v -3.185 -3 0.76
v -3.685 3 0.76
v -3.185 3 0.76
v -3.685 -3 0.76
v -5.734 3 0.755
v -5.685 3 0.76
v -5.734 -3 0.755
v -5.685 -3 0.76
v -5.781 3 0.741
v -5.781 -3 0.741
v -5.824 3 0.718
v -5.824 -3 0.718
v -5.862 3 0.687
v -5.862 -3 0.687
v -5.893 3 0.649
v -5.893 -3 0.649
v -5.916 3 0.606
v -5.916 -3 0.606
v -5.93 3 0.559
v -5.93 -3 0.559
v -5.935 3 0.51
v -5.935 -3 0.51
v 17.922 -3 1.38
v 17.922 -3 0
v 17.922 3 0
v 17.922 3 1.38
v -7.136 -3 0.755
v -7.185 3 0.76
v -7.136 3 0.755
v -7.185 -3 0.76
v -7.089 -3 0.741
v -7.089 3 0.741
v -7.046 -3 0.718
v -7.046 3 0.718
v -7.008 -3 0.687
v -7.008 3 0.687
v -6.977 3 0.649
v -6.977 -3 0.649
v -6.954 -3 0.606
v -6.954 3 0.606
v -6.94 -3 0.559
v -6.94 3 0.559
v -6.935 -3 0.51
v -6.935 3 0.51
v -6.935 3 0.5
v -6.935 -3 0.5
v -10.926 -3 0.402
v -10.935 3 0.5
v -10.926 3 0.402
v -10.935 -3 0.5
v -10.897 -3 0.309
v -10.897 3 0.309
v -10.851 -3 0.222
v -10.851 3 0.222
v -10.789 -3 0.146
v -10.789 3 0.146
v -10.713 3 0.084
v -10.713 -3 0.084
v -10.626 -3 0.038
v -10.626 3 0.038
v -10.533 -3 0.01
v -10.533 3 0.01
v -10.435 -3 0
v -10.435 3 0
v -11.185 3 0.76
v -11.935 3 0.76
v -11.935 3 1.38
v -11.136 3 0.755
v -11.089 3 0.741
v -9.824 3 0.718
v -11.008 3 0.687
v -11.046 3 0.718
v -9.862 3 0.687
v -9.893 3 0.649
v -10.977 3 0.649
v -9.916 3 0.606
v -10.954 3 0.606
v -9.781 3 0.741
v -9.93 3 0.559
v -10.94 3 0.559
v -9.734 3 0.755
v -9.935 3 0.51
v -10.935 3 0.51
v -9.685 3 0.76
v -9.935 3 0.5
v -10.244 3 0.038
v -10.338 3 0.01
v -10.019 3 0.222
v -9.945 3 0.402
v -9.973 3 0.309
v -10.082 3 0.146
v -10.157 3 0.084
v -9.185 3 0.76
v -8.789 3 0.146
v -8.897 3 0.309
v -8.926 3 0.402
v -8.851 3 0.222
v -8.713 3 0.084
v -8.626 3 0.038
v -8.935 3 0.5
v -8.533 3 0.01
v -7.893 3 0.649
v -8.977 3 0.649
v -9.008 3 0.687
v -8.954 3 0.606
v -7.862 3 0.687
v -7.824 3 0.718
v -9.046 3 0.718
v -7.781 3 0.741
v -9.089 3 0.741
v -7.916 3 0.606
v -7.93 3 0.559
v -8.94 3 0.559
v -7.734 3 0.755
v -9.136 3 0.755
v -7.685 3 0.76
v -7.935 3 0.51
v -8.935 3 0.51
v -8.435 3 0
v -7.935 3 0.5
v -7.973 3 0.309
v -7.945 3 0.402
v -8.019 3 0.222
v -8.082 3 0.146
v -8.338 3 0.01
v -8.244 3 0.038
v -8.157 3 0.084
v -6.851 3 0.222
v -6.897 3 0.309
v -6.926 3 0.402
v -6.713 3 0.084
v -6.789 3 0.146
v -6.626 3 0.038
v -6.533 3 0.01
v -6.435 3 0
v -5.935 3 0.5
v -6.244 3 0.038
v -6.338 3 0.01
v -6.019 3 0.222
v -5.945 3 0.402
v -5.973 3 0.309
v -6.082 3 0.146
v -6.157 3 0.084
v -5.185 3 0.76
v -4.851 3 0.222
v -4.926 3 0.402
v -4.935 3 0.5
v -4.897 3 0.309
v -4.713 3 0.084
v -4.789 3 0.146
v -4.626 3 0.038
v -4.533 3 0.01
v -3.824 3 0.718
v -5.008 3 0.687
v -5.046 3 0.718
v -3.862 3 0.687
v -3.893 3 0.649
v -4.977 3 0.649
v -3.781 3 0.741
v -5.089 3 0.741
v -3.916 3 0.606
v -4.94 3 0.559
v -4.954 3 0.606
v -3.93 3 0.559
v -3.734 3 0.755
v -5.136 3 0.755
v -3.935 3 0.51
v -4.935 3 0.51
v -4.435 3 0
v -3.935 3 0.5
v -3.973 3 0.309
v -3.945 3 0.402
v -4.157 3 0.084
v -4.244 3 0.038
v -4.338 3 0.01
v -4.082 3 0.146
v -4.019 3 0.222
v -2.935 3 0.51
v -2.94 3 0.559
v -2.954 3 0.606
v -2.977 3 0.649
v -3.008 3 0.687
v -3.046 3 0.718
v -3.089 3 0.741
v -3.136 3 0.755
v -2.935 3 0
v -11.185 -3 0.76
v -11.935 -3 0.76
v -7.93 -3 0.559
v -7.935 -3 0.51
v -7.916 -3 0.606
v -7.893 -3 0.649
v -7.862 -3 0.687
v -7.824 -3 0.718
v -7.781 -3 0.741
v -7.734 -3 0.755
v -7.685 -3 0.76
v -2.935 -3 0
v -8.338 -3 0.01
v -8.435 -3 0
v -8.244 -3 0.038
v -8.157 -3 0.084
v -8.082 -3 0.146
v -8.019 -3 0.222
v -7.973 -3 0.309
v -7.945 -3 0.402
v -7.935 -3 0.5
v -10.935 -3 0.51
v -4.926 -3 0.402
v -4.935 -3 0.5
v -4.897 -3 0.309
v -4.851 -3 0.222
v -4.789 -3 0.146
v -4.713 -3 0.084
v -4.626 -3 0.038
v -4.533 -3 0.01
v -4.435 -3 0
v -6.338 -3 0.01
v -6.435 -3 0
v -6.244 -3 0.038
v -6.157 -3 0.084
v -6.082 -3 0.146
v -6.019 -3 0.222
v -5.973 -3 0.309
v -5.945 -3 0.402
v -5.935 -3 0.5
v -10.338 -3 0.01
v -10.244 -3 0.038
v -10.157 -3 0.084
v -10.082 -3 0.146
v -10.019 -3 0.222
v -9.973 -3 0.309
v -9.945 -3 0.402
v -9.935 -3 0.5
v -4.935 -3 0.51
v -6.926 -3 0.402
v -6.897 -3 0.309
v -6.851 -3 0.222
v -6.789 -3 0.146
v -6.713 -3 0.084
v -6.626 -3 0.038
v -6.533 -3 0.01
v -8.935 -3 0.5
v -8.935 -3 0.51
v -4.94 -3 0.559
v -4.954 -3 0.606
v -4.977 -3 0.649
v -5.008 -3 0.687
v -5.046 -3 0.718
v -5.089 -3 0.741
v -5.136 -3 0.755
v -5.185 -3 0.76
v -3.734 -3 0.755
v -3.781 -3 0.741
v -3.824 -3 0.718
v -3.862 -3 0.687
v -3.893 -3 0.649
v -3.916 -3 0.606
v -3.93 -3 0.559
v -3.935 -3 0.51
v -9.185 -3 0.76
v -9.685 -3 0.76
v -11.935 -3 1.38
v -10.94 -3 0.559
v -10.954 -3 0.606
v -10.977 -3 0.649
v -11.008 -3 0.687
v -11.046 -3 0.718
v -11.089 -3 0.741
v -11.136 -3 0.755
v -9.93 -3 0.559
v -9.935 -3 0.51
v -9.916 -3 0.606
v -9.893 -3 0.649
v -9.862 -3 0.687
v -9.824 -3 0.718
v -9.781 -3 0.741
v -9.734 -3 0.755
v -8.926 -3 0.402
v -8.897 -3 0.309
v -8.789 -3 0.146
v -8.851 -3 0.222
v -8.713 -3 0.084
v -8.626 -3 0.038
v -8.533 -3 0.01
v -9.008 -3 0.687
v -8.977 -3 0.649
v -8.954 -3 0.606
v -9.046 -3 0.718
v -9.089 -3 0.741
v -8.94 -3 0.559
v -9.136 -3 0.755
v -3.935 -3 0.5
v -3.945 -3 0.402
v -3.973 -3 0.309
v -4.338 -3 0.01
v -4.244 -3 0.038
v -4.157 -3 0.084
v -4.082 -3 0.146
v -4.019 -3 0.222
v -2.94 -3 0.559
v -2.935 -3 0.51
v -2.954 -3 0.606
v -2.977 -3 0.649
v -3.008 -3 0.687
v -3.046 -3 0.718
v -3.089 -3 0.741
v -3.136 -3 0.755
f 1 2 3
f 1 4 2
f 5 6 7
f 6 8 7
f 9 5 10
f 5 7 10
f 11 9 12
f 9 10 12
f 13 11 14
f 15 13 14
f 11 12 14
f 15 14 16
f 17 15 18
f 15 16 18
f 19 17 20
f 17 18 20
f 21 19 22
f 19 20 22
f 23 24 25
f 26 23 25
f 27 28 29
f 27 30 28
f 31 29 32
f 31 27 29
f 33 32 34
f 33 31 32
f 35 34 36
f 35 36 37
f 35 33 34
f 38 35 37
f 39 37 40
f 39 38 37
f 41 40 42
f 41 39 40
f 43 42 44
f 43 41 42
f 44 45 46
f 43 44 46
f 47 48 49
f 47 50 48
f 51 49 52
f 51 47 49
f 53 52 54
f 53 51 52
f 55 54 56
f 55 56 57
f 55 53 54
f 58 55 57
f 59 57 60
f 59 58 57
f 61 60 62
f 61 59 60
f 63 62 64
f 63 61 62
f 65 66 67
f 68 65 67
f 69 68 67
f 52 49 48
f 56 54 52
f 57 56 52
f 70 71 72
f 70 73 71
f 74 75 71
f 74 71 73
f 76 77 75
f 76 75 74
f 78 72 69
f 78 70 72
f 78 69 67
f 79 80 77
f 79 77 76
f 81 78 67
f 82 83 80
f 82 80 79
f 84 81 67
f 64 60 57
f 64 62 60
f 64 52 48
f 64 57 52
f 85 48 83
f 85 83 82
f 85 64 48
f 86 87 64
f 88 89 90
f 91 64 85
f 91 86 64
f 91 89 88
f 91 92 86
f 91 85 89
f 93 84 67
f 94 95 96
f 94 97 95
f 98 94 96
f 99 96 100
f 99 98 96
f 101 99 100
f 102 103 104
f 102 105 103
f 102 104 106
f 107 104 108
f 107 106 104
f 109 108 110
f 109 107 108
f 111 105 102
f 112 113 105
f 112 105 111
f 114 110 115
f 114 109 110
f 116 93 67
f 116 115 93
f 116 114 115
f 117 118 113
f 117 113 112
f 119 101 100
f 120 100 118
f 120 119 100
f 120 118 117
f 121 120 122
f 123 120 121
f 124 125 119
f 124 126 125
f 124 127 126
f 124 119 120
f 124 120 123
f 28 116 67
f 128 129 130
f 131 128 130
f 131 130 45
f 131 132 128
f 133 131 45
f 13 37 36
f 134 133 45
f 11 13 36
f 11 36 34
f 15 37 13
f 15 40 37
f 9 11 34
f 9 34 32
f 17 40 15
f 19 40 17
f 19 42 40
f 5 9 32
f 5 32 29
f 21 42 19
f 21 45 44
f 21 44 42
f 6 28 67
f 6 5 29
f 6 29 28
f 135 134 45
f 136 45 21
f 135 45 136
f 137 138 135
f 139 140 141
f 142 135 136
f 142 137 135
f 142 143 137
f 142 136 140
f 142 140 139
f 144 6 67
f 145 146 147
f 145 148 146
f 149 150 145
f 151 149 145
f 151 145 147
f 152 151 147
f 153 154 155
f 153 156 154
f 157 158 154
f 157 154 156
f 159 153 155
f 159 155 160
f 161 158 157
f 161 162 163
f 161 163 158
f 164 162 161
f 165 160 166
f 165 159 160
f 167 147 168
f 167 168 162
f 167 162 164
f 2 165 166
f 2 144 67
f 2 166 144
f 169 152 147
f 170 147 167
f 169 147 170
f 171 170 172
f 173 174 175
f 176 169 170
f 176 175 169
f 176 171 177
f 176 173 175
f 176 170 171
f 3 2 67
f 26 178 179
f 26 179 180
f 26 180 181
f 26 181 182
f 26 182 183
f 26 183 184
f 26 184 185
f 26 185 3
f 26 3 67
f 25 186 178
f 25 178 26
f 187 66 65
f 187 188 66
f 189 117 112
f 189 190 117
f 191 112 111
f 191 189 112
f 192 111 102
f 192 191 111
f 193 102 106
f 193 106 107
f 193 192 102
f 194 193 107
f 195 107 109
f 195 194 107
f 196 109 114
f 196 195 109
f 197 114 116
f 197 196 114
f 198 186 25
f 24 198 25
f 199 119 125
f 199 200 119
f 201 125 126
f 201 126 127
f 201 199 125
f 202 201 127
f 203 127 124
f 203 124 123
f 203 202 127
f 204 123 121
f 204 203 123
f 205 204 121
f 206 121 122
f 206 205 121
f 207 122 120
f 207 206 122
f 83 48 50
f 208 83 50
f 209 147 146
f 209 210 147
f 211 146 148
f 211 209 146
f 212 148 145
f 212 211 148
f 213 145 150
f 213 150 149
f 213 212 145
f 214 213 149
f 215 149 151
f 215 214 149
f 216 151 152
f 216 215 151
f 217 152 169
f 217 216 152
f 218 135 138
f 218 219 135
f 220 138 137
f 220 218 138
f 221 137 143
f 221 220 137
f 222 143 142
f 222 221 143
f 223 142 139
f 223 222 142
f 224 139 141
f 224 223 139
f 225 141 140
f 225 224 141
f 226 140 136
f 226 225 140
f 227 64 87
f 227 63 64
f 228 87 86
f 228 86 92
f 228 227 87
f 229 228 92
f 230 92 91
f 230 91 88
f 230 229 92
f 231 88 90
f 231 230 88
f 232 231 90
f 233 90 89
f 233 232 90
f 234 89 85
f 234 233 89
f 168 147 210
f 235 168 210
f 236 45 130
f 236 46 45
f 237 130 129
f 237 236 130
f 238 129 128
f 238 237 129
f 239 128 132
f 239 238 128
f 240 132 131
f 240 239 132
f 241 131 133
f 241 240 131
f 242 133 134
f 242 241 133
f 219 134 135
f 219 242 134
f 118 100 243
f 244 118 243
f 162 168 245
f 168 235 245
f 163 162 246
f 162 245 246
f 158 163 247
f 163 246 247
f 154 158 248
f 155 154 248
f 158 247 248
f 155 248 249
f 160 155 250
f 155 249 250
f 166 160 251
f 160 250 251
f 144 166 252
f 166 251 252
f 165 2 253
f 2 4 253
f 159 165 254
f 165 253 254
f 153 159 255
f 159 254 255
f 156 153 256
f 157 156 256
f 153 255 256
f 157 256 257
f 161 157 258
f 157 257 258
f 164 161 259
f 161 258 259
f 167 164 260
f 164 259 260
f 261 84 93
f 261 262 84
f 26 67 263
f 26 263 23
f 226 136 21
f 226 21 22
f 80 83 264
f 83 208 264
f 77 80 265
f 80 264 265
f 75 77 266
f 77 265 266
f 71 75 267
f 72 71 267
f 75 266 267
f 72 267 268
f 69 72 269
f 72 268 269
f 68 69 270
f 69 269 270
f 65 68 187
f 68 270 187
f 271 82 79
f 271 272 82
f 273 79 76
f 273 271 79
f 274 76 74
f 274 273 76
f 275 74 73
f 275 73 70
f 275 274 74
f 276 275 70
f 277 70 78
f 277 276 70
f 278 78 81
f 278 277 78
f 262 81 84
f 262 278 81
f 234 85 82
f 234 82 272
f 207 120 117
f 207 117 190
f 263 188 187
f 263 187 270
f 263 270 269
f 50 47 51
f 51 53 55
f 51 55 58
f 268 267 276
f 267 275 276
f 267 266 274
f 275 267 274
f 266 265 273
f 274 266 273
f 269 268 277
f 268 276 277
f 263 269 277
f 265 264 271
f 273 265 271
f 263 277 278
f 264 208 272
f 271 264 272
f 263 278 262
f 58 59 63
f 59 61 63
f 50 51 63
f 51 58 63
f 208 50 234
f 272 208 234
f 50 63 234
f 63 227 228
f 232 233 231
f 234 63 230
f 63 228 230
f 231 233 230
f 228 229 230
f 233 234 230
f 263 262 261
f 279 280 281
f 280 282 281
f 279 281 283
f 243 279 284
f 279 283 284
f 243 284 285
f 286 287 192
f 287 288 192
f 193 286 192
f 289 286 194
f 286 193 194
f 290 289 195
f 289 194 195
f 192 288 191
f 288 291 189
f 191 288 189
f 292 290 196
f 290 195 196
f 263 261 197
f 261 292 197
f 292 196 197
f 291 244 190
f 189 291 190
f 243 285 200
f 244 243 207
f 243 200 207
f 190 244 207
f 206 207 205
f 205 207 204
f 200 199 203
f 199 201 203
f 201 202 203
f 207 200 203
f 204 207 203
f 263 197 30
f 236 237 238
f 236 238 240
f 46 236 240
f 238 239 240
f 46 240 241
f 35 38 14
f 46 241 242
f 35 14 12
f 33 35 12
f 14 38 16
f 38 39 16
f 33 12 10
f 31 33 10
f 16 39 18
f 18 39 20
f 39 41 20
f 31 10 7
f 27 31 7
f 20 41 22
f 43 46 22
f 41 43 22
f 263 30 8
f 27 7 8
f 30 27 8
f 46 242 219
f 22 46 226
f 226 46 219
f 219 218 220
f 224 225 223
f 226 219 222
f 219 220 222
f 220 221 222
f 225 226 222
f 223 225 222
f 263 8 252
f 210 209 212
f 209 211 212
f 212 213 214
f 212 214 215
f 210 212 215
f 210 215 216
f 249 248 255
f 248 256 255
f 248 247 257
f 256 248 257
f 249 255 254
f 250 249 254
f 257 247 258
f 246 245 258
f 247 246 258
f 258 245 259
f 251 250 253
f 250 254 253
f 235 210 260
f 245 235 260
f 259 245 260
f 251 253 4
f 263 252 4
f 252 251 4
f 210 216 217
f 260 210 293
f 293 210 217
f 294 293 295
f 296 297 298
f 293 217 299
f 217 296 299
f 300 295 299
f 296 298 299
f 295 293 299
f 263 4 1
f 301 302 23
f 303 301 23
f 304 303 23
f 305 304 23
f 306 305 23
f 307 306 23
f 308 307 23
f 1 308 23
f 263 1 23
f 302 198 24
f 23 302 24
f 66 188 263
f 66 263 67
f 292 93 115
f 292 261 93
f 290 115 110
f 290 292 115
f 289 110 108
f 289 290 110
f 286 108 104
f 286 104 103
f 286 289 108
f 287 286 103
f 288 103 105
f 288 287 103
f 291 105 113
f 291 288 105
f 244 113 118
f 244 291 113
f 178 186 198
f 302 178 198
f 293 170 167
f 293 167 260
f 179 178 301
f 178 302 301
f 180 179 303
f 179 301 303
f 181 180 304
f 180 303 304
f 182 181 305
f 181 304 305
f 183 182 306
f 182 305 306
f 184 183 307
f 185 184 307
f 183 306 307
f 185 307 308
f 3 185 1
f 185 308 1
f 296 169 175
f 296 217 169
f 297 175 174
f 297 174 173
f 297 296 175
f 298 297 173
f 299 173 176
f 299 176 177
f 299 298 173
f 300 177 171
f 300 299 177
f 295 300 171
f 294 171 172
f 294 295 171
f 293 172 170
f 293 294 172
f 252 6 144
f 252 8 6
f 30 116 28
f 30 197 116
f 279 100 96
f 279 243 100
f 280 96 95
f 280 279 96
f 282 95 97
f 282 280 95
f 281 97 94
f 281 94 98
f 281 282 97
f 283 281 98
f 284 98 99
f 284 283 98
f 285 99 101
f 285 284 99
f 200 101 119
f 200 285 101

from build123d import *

# Parameters (mm, degrees)
F0_W     = 29.8571444048
F0_H     = 6
F1_DEPTH = 1.38
F2_W     = 1
F2_H     = 6
F3_DEPTH = 0.76
F4_R     = 0.49999
F5_R     = 0.25


# Not quite as in the source:
# - a fillet or chamfer is up to 0.001 mm smaller than in the source, because OpenCascade refuses the exact size


with BuildPart() as f1:
    # F0 (on Top) → F1 (new body)
    with BuildSketch(Plane.XY):
        with Locations((2.9934216291, 0)):
            Rectangle(F0_W, F0_H)
    extrude(amount=F1_DEPTH)

    # F2 (on face) → F3 (cut)
    with BuildSketch(Plane(origin=(0, 0, 0), x_dir=(1, 0, 0), z_dir=(0, 0, -1))):
        with Locations((-11.4351505733, 0)):
            Rectangle(F2_W, F2_H)
        with Locations((-9.4351505733, 0)):
            Rectangle(F2_W, F2_H)
        with Locations((-7.4351505733, 0)):
            Rectangle(F2_W, F2_H)
        with Locations((-5.4351505733, 0)):
            Rectangle(F2_W, F2_H)
        with Locations((-3.4351505733, 0)):
            Rectangle(F2_W, F2_H)
    extrude(amount=-F3_DEPTH, mode=Mode.SUBTRACT)

    # F4 (radius 0.5 in the source; OpenCascade refuses exactly that, so slightly less here)
    f4_edges = [f1.edges().sort_by_distance(p)[0] for p in [
        (-10.935151, 0, 0),
        (-9.935151, 0, 0),
        (-8.935151, 0, 0),
        (-7.935151, 0, 0),
        (-6.935151, 0, 0),
        (-5.935151, 0, 0),
        (-4.935151, 0, 0),
        (-3.935151, 0, 0),
    ]]
    fillet(f4_edges, radius=F4_R)

    # F5
    f5_edges = [f1.edges().sort_by_distance(p)[0] for p in [
        (-10.935151, 0, 0.76),
        (-9.935151, 0, 0.76),
        (-8.935151, 0, 0.76),
        (-6.935151, 0, 0.76),
        (-4.935151, 0, 0.76),
        (-2.935151, 0, 0.76),
        (-3.935151, 0, 0.76),
        (-5.935151, 0, 0.76),
        (-7.935151, 0, 0.76),
    ]]
    fillet(f5_edges, radius=F5_R)


solid = f1.part
